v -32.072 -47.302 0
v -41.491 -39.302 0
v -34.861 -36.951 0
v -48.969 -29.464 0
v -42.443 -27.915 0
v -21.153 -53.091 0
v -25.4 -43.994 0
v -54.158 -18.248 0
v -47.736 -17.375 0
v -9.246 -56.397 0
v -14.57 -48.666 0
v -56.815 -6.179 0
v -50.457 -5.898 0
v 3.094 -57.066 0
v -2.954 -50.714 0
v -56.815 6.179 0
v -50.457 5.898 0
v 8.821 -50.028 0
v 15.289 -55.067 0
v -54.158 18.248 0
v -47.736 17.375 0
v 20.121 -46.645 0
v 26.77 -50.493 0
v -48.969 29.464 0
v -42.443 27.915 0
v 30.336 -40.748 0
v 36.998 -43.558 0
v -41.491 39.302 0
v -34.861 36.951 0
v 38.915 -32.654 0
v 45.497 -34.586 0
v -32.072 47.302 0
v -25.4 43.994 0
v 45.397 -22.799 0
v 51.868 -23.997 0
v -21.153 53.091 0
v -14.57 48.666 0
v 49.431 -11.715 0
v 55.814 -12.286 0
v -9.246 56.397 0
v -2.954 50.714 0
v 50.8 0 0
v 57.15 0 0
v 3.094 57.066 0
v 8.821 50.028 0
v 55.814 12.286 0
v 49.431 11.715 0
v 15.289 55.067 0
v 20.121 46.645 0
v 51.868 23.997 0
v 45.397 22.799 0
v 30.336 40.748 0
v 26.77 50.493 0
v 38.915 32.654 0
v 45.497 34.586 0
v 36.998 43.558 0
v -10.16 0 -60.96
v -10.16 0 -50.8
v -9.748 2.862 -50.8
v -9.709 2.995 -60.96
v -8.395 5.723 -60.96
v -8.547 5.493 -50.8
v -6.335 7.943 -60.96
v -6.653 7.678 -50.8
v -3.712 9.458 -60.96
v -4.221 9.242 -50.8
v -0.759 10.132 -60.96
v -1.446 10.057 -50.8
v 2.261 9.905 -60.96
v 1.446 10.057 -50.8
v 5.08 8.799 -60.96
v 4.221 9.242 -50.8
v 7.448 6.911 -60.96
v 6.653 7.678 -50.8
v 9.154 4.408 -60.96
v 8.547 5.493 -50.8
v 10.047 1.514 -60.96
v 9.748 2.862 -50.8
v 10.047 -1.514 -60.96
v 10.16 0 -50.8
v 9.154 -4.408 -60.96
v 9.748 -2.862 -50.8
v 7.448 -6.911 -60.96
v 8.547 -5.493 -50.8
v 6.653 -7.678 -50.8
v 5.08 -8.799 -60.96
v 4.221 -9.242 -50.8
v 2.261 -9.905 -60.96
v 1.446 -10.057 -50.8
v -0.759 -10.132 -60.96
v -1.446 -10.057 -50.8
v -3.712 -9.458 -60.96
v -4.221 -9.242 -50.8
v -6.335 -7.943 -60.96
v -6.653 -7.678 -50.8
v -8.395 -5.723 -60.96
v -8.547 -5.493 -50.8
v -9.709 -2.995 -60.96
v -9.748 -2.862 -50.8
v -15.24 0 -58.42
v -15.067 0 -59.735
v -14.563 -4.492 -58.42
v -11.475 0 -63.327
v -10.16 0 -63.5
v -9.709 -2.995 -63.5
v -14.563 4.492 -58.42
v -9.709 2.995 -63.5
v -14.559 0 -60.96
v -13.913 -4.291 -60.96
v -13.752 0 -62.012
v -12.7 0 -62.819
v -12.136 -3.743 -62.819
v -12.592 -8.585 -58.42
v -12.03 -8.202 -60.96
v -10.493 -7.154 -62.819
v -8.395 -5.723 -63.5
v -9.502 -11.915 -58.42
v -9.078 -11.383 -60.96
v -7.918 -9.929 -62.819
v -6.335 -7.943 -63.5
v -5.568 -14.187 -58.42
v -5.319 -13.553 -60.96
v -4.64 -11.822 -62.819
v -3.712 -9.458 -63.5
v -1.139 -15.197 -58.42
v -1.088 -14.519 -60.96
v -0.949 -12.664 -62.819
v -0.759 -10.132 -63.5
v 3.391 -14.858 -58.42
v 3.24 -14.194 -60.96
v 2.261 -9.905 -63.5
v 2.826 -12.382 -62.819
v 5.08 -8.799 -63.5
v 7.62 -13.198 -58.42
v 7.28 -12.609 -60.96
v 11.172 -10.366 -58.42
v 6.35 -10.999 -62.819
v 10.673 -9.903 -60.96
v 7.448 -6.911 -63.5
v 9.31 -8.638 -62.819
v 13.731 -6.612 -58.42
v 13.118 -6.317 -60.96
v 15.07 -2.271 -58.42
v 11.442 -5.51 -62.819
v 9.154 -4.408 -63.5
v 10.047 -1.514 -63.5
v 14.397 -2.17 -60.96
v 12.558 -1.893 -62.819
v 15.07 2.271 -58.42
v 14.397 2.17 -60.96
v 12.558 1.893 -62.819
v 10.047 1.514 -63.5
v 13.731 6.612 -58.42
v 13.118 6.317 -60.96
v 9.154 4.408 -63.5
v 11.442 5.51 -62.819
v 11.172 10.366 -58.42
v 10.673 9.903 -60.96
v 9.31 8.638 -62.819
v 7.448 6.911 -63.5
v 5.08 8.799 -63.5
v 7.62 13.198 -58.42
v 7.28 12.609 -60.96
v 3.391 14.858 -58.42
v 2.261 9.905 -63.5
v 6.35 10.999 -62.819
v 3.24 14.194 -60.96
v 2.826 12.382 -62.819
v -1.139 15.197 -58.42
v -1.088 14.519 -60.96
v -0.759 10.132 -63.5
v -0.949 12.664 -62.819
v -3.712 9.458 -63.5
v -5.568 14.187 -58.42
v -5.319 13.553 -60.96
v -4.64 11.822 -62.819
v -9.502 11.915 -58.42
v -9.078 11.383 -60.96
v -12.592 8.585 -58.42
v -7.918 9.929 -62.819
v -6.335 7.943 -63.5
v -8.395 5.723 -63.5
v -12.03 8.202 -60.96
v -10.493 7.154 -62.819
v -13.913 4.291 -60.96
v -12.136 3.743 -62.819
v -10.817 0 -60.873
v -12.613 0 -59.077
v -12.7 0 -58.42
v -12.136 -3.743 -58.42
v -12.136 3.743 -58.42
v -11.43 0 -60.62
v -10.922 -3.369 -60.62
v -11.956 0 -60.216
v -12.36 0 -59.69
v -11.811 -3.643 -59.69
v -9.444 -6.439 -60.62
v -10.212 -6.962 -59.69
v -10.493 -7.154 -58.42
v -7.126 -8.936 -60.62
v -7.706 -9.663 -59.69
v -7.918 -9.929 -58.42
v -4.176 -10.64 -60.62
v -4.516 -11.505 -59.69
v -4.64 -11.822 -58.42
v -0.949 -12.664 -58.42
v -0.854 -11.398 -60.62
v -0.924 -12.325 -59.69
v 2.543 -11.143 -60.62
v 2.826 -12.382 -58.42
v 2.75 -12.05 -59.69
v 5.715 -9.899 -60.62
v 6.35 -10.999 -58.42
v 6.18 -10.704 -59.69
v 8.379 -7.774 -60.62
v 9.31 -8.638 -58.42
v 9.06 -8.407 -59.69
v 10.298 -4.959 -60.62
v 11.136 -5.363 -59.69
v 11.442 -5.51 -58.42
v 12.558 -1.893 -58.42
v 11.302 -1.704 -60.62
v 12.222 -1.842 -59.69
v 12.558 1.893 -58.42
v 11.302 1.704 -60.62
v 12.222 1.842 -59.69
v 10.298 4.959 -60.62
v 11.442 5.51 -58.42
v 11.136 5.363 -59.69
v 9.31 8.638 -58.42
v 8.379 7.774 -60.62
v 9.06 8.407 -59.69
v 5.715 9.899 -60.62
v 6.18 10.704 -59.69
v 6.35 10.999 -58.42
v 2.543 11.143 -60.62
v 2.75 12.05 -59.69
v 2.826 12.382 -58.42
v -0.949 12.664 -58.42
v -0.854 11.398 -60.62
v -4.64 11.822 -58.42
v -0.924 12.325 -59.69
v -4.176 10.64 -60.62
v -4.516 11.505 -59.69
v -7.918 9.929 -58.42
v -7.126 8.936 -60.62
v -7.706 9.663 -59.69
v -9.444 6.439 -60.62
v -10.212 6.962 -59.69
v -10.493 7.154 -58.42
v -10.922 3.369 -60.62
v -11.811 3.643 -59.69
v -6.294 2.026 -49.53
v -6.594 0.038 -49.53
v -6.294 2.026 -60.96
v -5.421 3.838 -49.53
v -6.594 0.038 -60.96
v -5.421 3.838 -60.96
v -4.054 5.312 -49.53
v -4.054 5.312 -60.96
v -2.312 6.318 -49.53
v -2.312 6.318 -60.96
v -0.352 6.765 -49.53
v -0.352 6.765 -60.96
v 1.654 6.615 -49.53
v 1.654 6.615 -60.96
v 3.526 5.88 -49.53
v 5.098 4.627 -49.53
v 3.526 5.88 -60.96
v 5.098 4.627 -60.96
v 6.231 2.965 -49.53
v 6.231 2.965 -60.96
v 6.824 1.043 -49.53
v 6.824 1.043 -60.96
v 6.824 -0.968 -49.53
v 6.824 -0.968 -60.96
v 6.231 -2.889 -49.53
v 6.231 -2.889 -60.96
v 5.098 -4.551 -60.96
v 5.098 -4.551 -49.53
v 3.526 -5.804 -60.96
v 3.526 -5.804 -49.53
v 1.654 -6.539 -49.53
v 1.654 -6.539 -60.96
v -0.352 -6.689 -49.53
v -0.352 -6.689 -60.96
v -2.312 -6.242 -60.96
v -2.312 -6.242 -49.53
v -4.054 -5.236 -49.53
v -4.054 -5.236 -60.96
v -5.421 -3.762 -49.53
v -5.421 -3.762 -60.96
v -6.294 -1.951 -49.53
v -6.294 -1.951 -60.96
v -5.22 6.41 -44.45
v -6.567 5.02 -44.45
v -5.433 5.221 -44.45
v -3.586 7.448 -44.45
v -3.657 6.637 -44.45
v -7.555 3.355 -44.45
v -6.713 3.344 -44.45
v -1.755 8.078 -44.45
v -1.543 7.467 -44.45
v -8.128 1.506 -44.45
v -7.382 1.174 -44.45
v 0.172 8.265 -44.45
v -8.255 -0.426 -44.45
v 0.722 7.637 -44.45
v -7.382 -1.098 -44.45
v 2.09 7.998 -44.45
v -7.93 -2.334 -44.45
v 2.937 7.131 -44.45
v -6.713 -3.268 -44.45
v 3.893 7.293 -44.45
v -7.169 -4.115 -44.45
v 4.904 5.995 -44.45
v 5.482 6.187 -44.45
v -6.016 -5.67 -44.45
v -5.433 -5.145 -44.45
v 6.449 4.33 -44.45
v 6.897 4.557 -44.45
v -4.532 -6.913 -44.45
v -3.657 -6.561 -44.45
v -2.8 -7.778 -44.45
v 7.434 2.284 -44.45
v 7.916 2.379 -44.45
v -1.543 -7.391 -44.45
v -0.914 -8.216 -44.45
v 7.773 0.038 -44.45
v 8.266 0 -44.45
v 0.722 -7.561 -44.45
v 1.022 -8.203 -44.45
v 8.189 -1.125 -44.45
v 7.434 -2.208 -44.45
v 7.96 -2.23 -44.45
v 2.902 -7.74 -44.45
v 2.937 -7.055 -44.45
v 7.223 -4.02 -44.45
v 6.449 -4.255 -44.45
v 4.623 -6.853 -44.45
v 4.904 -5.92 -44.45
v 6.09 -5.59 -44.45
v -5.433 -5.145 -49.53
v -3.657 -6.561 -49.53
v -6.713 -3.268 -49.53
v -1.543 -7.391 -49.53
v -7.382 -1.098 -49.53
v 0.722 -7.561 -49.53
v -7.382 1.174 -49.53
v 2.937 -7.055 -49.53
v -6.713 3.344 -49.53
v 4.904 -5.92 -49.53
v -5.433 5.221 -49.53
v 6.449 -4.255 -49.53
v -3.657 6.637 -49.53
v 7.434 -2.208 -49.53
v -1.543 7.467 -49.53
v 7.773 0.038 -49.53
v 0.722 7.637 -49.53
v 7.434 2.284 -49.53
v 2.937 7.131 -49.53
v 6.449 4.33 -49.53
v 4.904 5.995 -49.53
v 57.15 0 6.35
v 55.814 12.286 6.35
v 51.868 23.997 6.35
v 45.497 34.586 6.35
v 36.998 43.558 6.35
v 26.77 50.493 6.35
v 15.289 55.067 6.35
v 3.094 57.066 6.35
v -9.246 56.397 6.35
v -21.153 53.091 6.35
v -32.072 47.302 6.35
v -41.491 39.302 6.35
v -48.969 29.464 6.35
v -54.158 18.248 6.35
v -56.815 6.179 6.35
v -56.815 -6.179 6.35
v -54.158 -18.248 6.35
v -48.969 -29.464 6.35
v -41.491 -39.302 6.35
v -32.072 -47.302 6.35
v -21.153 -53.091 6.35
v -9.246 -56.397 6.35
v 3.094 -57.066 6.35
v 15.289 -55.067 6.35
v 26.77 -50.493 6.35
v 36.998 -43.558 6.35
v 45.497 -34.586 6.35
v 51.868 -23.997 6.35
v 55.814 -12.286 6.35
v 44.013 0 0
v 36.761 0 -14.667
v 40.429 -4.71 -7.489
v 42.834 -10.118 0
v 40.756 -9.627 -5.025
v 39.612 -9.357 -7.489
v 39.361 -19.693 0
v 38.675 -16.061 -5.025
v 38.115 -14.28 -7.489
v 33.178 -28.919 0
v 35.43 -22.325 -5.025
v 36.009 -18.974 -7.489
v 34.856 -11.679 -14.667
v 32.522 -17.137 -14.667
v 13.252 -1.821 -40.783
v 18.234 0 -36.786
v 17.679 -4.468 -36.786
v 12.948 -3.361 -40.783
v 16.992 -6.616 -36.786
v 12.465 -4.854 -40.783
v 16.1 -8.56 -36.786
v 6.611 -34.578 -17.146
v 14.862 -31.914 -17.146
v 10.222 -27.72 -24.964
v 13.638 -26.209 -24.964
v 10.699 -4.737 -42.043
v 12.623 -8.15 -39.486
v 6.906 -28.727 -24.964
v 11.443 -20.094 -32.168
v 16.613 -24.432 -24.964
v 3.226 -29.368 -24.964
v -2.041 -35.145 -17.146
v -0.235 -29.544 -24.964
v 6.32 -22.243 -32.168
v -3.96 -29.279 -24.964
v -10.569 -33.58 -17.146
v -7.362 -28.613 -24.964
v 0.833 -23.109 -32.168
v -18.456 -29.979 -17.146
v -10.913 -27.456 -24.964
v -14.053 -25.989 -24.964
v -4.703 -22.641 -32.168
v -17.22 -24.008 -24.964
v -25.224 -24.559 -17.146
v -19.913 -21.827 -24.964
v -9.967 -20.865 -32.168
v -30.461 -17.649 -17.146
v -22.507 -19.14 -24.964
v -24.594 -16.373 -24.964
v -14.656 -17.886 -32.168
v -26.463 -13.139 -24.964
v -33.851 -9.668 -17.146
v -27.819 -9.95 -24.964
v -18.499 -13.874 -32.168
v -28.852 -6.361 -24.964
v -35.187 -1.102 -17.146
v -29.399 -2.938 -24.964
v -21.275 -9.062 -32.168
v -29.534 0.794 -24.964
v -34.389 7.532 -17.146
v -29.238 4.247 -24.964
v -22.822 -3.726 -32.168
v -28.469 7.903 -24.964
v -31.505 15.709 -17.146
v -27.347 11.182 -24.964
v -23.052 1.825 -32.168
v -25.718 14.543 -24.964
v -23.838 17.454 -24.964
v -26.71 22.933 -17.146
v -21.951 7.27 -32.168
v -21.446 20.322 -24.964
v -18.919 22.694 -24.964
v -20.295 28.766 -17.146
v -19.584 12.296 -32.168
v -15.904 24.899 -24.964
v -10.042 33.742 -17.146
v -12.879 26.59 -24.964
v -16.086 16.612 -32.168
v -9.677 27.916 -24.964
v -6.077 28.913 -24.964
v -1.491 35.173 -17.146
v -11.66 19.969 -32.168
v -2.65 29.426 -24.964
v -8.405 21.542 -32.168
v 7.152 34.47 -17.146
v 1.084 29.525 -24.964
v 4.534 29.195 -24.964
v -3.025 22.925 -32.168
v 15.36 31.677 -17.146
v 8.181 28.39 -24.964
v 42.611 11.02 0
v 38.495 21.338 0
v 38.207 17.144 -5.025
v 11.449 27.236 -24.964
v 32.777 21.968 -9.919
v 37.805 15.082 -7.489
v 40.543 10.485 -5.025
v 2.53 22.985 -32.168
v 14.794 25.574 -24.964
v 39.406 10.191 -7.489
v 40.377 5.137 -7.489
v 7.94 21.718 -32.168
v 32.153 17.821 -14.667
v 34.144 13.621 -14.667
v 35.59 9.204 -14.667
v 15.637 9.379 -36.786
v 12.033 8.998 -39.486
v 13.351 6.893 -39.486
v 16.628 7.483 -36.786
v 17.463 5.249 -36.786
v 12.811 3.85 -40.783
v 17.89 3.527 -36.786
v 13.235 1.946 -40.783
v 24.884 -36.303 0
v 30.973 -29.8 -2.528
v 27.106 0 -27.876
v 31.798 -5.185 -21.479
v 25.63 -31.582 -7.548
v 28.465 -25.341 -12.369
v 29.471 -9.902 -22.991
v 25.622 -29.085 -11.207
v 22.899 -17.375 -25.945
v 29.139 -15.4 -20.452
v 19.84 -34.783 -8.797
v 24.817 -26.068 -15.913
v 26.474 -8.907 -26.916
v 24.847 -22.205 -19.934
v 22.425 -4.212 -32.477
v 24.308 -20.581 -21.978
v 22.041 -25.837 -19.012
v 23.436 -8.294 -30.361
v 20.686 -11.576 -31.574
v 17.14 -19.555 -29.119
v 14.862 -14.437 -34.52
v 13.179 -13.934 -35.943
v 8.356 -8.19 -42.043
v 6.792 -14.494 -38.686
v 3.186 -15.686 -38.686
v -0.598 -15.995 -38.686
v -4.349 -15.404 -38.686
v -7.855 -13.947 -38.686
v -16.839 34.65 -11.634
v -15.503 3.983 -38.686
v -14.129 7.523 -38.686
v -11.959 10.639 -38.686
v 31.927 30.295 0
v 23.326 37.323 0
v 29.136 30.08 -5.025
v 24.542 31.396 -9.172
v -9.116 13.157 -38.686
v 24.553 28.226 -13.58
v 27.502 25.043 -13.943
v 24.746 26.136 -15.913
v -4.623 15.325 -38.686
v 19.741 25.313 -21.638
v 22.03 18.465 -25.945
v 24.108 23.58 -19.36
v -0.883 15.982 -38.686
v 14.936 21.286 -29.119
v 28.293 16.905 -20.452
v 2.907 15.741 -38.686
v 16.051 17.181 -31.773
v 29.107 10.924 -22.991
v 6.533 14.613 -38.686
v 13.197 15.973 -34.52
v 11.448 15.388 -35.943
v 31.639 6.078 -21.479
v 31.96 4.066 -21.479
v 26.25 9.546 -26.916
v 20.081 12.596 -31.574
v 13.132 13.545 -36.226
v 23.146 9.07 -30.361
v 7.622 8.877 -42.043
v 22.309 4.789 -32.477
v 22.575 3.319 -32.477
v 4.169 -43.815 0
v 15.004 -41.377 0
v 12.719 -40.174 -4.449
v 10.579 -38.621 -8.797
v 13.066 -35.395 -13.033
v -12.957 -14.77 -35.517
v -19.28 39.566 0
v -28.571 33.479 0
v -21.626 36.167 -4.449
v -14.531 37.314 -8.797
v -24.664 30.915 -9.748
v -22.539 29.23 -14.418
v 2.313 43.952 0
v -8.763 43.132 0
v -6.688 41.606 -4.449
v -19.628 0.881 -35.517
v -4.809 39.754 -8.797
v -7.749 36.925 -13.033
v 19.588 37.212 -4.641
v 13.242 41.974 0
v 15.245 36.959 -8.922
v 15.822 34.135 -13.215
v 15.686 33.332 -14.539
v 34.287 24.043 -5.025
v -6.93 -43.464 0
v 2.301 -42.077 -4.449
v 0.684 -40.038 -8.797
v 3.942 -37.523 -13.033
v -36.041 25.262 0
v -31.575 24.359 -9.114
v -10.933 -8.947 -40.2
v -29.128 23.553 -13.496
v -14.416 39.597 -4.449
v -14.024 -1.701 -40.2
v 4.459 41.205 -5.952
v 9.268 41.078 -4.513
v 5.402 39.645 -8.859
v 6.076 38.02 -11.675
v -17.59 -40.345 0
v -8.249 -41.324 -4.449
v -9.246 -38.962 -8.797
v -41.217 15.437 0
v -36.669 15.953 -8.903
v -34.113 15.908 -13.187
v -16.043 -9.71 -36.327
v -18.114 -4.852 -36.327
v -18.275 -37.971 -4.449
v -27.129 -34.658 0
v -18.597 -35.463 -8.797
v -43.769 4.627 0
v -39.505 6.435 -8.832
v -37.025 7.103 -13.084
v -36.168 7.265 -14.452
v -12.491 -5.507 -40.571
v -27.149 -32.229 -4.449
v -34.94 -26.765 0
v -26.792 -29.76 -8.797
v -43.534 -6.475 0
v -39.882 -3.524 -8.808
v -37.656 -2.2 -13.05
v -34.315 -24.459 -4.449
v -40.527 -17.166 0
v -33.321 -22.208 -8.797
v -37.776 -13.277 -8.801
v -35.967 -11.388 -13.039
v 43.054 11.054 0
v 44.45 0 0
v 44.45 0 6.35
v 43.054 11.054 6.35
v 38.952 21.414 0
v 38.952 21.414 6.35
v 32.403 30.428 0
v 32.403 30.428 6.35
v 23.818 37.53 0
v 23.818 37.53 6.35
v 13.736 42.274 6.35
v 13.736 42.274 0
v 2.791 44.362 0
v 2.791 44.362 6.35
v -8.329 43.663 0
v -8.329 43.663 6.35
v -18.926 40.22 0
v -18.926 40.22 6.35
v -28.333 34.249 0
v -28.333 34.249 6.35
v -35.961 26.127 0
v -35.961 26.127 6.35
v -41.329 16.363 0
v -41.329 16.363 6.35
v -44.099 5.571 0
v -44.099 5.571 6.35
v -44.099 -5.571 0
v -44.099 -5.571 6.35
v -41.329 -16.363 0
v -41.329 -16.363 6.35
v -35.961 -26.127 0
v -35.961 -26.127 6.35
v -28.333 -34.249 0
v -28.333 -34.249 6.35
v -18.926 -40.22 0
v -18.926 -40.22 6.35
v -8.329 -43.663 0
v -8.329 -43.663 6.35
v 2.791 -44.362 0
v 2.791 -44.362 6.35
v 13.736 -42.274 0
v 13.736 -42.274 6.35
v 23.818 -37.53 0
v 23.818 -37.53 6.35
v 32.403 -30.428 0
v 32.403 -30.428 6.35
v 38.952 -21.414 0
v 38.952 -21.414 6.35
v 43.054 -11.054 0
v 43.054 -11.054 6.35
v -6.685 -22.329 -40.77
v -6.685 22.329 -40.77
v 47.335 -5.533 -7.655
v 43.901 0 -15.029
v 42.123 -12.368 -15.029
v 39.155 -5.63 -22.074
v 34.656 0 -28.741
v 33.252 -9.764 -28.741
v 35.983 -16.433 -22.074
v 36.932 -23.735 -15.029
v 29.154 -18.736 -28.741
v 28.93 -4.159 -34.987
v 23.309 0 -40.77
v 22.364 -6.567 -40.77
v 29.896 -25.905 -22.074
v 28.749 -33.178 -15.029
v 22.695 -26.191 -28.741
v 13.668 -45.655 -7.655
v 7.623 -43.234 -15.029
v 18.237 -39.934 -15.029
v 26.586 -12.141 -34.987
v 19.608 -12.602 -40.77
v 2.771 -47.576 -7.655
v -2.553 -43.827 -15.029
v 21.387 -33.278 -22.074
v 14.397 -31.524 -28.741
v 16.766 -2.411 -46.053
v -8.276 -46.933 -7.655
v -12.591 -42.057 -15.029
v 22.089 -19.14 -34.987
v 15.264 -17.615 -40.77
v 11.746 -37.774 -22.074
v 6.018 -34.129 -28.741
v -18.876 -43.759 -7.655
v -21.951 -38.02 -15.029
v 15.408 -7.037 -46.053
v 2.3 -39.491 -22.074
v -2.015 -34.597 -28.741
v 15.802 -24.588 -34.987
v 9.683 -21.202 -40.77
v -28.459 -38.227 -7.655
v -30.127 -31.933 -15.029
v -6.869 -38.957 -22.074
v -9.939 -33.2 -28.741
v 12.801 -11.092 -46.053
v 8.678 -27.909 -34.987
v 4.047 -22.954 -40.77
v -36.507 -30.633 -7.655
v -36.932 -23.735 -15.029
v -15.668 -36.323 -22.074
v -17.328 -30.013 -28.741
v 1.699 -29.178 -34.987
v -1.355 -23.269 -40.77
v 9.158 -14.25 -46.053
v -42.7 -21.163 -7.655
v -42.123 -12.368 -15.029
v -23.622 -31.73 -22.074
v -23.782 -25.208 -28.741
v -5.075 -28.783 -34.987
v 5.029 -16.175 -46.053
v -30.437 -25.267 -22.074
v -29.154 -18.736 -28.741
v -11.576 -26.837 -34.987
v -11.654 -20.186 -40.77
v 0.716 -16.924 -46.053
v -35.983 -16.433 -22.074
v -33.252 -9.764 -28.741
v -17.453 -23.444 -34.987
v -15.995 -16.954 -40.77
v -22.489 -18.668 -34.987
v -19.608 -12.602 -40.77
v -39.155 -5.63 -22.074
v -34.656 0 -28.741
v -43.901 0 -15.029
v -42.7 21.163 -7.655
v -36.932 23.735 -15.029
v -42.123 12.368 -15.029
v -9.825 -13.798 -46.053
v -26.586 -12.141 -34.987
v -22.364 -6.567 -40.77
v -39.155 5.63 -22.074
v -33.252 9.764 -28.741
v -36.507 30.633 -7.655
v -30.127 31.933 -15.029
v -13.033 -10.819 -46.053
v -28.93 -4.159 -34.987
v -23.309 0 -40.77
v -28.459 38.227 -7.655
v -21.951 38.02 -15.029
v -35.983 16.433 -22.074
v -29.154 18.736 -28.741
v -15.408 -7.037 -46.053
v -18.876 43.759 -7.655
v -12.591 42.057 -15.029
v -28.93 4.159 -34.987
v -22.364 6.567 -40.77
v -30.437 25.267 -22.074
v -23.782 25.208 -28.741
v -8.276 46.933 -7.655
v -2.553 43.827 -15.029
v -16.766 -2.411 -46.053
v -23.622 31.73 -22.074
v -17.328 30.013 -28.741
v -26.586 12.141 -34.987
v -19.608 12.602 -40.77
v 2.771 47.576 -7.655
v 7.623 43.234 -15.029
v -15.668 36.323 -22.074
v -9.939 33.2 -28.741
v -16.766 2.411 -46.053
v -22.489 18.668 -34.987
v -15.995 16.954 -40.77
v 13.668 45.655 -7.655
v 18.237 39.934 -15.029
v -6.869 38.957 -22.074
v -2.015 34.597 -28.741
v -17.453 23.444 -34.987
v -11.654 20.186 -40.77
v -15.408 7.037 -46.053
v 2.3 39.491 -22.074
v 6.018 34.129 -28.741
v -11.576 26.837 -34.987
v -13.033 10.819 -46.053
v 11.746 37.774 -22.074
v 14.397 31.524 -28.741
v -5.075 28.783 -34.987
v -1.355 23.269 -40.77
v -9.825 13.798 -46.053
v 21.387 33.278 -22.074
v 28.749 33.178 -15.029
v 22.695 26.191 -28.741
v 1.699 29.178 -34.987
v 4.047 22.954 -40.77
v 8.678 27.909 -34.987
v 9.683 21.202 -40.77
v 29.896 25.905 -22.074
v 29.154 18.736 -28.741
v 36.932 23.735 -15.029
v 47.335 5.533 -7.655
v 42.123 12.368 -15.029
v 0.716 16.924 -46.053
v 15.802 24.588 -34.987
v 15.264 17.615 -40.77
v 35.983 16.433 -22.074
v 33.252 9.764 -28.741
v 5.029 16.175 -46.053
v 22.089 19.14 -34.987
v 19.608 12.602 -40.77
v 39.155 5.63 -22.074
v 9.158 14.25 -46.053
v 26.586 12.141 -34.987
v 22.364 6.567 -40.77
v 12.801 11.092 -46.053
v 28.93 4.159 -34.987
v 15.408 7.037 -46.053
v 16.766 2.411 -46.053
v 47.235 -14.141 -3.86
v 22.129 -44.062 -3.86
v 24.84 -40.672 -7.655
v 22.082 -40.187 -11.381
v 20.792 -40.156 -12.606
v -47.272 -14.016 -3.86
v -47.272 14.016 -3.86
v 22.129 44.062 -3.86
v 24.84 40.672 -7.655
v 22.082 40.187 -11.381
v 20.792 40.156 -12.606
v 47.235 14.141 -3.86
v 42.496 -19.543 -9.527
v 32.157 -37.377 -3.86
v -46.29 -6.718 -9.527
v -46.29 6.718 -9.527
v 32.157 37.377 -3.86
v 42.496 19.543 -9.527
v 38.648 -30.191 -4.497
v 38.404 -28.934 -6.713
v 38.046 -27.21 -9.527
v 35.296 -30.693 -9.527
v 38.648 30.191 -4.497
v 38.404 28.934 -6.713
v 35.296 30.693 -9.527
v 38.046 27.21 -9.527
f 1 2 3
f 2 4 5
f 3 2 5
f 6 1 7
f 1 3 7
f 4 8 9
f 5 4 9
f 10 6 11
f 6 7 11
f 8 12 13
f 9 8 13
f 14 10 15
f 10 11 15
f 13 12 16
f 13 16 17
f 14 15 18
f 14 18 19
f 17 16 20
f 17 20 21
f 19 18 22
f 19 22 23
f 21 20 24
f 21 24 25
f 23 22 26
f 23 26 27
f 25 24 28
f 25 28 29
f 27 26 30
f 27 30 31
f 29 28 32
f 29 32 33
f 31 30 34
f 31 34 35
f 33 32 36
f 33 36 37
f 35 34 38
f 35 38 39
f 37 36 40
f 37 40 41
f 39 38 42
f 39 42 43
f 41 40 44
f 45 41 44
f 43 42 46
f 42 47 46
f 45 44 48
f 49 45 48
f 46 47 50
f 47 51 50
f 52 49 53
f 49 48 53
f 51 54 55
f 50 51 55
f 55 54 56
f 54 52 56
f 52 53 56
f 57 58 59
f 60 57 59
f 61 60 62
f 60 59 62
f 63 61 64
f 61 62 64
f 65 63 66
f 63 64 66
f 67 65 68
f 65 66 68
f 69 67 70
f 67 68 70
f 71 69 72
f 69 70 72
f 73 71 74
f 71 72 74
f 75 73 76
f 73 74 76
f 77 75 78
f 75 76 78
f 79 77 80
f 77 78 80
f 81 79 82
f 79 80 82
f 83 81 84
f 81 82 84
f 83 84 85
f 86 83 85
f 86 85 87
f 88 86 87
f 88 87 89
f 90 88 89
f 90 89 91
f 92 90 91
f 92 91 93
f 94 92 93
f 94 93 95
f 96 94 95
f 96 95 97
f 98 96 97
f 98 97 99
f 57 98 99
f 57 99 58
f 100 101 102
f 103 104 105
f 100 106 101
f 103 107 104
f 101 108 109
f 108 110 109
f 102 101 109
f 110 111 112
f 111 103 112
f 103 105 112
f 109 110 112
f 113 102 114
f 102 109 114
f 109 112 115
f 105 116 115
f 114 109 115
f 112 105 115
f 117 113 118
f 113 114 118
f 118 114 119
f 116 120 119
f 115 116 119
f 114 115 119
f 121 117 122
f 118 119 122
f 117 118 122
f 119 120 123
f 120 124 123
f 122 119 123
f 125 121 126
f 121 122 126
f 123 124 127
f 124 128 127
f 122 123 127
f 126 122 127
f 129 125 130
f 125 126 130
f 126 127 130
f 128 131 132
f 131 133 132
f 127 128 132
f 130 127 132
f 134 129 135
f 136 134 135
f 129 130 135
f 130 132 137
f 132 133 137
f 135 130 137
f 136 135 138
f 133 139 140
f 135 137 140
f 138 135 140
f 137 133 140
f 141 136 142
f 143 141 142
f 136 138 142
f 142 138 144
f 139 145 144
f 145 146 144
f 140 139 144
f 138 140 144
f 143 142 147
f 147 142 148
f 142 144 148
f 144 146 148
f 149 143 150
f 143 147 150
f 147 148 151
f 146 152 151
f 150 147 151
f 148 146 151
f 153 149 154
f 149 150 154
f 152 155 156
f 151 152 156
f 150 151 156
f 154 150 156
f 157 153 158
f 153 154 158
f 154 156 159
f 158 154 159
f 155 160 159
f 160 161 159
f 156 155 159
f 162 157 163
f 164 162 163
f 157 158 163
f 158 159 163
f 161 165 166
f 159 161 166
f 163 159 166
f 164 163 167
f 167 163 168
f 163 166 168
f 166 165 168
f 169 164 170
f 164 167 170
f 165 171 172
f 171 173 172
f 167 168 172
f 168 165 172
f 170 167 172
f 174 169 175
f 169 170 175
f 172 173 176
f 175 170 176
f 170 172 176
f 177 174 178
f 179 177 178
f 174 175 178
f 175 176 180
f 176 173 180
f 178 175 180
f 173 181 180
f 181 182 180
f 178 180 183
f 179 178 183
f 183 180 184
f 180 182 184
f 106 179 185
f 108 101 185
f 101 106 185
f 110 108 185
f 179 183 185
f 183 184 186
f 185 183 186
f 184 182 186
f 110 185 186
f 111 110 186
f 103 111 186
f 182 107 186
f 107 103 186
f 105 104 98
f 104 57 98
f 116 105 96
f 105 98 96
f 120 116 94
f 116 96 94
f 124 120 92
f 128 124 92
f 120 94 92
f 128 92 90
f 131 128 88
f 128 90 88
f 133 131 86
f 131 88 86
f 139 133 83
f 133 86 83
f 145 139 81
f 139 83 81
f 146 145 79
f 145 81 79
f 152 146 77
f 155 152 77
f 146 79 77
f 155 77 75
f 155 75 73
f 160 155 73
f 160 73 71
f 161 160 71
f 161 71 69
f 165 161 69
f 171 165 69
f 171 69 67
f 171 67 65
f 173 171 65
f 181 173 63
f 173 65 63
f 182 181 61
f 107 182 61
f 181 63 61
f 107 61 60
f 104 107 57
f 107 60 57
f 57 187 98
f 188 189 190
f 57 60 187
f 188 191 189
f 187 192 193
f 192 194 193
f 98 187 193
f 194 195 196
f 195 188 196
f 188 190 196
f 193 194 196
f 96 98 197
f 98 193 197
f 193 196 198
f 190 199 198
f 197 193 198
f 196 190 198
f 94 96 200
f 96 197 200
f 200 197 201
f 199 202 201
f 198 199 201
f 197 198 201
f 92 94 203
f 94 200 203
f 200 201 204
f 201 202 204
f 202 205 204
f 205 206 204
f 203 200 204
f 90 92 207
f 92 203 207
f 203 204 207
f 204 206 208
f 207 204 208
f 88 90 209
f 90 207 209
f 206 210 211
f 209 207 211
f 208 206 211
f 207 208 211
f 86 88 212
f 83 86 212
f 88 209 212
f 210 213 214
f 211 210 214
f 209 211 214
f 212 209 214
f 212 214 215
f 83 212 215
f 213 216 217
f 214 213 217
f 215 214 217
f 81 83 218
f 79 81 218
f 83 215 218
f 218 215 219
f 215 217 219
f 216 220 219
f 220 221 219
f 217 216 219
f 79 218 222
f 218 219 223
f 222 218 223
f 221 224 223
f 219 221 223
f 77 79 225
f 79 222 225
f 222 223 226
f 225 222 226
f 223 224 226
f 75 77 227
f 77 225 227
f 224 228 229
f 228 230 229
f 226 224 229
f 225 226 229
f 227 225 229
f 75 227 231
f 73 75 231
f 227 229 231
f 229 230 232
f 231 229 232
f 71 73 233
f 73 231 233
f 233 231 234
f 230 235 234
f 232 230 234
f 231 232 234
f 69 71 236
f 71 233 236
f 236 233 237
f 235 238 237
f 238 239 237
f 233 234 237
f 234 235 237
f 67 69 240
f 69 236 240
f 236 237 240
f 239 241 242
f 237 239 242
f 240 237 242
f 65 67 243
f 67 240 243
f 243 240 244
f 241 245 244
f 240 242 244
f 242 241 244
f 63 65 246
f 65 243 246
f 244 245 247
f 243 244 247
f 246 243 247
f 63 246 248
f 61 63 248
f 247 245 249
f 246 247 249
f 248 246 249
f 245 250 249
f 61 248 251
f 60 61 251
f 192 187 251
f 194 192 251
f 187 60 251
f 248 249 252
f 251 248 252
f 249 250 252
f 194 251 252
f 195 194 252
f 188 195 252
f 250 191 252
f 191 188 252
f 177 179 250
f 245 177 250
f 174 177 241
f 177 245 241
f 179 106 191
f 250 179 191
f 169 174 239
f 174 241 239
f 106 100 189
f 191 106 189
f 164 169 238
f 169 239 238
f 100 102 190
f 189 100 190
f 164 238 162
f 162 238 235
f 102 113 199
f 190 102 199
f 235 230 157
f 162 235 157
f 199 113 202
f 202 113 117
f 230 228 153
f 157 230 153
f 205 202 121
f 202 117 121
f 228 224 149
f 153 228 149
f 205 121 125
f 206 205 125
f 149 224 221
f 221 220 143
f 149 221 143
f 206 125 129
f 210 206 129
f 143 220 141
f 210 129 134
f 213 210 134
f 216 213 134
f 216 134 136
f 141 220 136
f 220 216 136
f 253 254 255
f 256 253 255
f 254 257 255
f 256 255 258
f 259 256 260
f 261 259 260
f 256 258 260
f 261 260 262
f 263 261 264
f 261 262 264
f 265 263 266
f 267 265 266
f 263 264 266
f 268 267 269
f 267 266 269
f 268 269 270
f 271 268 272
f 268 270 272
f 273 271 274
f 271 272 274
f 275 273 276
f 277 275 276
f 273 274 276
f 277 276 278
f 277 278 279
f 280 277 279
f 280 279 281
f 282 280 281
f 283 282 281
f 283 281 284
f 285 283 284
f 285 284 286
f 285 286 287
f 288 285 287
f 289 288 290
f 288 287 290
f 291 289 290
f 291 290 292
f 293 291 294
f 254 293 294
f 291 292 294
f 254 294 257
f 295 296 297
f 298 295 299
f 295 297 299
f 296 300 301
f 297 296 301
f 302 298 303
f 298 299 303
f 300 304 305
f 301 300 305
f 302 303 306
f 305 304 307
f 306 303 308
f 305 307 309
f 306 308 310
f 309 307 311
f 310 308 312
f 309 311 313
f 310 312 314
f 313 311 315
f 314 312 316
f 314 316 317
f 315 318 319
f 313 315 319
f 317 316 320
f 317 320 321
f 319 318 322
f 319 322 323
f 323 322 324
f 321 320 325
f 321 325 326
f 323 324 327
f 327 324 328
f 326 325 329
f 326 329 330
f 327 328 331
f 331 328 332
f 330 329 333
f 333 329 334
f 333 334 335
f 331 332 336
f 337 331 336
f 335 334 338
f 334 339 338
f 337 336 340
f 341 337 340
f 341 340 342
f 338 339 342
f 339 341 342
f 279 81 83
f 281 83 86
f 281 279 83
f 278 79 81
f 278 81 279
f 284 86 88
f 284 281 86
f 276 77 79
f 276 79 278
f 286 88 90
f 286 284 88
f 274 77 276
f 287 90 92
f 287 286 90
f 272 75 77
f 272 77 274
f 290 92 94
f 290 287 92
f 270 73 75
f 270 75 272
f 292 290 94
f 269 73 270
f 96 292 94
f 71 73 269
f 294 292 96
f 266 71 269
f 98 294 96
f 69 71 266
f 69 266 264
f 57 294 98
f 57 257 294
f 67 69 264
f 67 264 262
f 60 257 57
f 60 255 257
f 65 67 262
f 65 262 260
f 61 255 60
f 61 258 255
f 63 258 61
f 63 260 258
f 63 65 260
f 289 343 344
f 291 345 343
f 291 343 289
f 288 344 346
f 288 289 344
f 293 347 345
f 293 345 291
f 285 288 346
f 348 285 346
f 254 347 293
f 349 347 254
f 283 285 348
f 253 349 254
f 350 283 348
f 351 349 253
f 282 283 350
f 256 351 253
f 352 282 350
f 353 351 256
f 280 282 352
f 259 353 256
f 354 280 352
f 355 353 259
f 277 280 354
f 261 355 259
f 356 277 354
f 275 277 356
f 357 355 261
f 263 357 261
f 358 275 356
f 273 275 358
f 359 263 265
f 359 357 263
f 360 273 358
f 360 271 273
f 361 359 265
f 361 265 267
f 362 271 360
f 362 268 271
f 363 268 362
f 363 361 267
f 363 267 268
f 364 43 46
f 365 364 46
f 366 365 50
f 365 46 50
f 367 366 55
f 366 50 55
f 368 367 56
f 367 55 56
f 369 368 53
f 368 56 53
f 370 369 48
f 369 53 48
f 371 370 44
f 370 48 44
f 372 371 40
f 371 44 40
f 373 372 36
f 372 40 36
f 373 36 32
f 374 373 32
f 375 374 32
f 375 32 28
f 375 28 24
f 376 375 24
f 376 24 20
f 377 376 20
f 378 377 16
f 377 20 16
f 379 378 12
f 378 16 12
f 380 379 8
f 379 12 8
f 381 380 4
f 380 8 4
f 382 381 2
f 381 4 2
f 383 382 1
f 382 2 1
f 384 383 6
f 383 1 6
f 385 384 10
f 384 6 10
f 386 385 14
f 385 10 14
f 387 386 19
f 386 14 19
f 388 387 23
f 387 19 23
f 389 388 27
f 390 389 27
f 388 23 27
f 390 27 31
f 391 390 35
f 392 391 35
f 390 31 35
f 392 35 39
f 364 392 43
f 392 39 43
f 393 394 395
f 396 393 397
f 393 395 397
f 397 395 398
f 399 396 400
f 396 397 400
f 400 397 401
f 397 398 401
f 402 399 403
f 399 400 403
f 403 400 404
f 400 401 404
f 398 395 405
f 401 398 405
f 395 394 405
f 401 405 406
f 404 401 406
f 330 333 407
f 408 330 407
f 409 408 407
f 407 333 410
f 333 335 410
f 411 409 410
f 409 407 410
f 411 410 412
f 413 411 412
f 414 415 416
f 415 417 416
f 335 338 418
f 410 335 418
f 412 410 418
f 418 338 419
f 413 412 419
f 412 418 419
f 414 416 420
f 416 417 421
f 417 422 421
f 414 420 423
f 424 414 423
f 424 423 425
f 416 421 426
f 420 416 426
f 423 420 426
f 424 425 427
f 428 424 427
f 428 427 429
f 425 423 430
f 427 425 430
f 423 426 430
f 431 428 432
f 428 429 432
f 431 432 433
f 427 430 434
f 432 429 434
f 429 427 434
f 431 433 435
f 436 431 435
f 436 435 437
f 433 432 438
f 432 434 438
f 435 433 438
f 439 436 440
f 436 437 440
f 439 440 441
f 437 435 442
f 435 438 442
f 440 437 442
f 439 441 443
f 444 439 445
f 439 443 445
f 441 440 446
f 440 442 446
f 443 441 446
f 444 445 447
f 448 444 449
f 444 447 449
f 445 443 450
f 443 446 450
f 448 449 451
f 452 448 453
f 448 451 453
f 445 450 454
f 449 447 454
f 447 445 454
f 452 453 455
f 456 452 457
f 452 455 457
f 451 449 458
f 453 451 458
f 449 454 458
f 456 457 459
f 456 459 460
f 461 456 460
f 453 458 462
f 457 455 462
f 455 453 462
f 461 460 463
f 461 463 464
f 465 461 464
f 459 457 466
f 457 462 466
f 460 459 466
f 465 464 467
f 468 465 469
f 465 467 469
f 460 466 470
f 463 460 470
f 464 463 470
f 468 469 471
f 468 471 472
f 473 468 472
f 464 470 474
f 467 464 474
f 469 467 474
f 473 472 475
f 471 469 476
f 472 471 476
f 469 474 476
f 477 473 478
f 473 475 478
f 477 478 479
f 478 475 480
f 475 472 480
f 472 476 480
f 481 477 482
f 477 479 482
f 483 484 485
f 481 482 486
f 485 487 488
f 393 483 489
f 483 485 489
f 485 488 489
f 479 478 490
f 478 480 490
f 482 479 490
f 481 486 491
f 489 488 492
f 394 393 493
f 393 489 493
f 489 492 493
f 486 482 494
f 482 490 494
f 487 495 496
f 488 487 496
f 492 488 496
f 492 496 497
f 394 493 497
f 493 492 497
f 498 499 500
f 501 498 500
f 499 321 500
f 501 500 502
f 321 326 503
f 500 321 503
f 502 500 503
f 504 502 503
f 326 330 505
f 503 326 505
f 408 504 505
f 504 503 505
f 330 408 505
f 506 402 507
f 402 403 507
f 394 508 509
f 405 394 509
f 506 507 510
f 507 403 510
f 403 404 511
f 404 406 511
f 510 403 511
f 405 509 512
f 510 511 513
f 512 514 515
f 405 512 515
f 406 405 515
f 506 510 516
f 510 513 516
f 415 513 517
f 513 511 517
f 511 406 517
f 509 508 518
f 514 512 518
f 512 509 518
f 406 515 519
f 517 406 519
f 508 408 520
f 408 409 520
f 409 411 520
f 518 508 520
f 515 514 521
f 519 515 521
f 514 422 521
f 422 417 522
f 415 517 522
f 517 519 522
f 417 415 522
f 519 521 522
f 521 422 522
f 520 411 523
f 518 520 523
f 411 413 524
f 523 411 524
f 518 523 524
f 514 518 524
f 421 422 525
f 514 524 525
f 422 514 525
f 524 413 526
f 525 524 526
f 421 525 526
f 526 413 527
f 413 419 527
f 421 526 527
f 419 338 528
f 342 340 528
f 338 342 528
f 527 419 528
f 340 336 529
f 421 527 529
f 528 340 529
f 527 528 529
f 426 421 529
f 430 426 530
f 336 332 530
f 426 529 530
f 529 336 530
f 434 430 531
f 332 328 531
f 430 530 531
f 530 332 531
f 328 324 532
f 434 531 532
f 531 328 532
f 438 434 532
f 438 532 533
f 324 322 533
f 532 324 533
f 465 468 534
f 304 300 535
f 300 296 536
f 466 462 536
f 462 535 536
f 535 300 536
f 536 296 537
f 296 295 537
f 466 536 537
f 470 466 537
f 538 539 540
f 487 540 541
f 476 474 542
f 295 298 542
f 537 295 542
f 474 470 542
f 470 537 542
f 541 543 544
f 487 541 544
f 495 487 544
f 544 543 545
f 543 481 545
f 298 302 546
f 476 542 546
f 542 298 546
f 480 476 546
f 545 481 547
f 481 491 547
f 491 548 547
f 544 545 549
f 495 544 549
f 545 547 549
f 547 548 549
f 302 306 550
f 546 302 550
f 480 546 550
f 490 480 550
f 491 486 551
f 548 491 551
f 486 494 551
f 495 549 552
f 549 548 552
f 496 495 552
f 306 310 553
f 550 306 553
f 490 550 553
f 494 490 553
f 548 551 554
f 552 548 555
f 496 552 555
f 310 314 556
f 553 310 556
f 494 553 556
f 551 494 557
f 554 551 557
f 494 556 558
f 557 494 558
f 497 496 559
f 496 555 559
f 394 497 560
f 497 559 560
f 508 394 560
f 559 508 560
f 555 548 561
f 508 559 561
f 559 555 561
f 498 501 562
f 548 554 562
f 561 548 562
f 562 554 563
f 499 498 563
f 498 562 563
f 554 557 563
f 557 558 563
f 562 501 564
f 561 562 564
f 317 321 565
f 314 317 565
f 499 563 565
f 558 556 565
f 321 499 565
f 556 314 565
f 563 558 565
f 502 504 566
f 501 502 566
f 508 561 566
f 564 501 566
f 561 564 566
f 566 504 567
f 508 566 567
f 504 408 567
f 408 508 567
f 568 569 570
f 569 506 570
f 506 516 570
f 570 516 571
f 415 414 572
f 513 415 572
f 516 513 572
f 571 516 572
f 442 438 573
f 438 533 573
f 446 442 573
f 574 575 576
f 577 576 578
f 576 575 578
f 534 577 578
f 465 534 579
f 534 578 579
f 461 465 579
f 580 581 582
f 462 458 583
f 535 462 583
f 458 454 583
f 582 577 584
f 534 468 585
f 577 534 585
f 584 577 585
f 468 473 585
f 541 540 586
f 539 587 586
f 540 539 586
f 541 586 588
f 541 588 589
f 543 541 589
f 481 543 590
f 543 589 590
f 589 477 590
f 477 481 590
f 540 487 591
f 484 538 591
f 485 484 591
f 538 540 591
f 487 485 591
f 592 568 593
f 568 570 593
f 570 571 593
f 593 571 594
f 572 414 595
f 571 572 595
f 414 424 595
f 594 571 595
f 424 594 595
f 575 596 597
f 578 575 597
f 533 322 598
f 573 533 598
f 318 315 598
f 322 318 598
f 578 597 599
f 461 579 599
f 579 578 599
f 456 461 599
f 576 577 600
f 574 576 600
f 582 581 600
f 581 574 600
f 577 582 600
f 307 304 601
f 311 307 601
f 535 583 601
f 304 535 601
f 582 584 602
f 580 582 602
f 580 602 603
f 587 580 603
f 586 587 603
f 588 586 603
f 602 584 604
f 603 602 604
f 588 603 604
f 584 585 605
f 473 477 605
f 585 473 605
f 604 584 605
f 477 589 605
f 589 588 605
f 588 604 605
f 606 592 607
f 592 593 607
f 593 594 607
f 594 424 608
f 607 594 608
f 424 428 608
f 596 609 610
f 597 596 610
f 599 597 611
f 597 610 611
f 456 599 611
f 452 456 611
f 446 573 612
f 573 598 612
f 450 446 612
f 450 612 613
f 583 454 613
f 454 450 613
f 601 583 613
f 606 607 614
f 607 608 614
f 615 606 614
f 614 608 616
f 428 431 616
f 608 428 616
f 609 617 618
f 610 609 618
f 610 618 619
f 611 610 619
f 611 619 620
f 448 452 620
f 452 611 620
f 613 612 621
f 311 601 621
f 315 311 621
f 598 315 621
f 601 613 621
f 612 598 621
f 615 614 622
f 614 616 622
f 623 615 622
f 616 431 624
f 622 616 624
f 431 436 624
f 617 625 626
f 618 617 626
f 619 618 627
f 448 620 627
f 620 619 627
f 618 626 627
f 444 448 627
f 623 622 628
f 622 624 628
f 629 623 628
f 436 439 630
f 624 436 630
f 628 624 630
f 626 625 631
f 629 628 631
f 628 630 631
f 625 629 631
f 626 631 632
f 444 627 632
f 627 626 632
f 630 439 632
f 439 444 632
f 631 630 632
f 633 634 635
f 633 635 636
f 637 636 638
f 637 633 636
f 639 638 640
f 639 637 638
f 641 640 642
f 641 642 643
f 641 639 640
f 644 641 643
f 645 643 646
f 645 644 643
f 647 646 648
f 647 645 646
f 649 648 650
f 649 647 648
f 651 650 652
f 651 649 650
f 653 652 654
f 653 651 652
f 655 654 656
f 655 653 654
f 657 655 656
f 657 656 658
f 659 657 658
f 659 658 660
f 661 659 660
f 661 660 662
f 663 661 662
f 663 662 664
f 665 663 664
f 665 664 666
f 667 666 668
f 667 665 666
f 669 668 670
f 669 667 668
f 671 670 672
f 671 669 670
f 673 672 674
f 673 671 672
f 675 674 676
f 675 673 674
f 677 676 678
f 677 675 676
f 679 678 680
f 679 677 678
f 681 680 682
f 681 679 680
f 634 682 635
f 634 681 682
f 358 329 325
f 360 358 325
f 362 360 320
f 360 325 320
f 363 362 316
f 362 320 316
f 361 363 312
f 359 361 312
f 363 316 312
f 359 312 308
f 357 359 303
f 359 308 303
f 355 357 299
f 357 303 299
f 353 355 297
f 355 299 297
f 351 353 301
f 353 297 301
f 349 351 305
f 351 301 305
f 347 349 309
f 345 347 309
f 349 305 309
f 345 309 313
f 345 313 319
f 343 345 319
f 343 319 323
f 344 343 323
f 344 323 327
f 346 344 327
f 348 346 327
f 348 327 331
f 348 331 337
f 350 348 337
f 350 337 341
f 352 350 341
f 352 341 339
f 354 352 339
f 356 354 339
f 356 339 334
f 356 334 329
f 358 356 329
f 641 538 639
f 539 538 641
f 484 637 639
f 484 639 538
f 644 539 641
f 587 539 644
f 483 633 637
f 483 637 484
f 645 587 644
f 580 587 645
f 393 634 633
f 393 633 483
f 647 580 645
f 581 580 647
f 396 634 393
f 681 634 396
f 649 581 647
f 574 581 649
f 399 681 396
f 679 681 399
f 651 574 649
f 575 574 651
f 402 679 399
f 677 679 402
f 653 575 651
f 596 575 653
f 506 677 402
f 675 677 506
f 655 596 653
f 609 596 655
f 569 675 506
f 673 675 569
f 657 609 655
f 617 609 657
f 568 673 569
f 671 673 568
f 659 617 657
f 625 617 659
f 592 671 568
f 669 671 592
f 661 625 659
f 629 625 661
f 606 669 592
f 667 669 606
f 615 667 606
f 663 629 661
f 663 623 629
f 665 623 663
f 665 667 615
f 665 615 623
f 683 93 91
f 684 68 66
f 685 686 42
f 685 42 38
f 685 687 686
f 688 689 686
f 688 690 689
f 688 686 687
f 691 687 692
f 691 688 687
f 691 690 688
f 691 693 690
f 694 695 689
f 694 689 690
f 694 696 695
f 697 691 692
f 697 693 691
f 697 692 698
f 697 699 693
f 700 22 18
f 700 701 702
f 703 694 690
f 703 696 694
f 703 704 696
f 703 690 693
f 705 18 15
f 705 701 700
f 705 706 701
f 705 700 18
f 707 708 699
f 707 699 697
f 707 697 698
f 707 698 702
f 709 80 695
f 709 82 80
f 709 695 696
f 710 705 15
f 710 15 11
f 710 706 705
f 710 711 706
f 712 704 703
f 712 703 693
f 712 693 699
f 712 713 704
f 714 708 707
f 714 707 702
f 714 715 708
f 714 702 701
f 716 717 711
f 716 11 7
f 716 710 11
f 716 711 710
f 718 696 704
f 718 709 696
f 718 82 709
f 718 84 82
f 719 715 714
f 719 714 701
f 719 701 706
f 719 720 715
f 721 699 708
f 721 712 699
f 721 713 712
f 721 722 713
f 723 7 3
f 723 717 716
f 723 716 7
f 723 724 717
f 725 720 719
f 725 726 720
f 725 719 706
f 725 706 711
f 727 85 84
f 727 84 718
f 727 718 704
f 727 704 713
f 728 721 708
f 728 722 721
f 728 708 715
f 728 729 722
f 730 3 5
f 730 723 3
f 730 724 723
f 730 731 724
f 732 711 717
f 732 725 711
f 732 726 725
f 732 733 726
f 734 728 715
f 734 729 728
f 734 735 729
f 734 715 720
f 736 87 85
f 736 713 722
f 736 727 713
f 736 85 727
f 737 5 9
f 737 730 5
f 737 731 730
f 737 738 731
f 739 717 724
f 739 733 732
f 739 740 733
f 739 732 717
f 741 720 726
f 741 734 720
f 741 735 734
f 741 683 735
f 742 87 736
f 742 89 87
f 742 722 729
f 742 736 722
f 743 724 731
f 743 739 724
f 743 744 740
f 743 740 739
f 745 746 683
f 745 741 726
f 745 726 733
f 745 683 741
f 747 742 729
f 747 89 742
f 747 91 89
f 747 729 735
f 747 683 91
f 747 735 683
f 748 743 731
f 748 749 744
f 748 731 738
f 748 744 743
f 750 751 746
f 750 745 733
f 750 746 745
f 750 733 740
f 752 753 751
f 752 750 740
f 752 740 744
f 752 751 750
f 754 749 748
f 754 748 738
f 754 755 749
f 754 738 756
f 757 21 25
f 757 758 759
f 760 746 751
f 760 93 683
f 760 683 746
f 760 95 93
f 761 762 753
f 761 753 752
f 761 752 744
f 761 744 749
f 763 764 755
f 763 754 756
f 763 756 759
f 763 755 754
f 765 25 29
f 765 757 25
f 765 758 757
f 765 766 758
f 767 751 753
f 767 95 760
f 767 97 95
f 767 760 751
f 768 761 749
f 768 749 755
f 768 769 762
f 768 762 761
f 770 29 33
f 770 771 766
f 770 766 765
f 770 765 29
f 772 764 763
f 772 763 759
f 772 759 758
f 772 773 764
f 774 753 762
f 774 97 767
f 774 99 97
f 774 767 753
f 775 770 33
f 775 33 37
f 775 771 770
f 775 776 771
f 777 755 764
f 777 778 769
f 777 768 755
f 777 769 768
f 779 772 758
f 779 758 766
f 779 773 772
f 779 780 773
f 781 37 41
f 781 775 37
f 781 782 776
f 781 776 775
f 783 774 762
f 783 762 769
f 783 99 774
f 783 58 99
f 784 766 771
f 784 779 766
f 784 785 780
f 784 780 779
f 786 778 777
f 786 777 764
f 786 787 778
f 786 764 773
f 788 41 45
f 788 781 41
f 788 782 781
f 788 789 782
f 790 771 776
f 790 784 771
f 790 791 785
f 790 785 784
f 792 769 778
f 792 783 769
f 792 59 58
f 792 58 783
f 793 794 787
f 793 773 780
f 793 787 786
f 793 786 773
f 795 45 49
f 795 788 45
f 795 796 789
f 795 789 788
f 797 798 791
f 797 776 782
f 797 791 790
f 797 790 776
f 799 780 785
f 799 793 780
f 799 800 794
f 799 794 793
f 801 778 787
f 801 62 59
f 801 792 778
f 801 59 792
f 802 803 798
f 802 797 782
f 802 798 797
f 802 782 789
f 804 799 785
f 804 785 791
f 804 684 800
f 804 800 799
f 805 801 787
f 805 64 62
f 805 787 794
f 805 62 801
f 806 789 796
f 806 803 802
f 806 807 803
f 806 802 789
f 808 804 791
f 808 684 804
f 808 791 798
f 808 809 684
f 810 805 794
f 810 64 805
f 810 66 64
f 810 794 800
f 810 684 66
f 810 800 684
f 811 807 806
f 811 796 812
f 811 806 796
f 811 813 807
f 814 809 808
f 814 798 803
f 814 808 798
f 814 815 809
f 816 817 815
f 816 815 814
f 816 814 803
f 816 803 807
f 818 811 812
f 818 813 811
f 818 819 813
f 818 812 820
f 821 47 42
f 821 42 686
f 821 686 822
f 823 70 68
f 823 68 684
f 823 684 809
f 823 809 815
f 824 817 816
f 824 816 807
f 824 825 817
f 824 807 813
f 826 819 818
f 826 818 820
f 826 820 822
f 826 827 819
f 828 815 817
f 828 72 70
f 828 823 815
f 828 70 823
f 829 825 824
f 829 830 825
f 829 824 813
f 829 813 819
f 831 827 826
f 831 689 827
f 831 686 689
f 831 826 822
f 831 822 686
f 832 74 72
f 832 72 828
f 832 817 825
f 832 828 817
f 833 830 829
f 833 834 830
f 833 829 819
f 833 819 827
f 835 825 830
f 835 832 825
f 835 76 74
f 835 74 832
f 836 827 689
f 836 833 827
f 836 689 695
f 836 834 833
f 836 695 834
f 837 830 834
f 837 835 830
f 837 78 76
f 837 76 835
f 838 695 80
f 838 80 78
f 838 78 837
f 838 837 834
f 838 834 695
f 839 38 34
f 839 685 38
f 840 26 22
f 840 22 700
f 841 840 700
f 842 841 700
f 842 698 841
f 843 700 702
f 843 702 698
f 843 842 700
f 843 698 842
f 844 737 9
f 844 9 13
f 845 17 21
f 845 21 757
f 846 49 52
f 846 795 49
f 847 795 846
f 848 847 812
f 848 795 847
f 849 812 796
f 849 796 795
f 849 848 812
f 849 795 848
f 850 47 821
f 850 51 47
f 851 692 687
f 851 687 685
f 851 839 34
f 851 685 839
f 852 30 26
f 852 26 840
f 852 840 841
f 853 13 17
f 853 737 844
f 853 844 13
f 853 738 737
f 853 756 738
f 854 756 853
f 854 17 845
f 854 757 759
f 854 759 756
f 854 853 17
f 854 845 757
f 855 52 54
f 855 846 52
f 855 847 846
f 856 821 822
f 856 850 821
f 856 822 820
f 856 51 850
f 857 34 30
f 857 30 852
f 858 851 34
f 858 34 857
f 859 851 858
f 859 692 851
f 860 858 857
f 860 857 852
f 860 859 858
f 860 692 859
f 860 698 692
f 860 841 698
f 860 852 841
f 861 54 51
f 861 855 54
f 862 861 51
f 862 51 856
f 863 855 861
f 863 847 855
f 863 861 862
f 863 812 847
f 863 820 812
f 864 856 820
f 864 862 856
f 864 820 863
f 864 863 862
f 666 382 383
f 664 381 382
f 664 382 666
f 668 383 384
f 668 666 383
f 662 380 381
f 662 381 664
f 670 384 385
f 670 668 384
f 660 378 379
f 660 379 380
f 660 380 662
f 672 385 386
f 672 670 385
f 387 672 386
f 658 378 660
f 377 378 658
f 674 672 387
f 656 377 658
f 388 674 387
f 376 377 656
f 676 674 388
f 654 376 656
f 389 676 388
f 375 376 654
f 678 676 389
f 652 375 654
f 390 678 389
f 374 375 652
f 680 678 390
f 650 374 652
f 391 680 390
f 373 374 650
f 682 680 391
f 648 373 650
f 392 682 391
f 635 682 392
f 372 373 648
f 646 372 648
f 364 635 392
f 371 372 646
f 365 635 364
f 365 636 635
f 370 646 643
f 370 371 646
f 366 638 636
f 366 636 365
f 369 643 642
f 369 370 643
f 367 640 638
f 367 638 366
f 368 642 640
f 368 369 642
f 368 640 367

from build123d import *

# Parameters (mm, degrees)
LENS_SHELL_T          = -6.35
SKETCH2_R             = 10.16
LENS_NECK_DEPTH       = 10.16
BULB_HOLE_D           = 13.49248
BULB_HOLE_CBORE_D     = 15.24
BULB_HOLE_CBORE_DEPTH = 5.08
SKETCH5_R             = 57.15
SKETCH5_R_2           = 44.45
LENS_COVER_DEPTH      = 6.35


with BuildPart() as part:
    # Sketch1 → Base Revolve (revolve)
    with BuildSketch(Plane(origin=(0, 0, 0), x_dir=(0, 0, -1), z_dir=(1, 0, 0)), mode=Mode.PRIVATE) as base_revolve_sk:
        with BuildLine():
            Line((0, 0), (0, 50.8))
            ThreePointArc((0, 50.8), (28.740706548, 34.655883185), (50.8, 10.16))
            Line((50.8, 10.16), (50.8, 0))
            Line((50.8, 0), (0, 0))
        make_face()
    revolve(base_revolve_sk.sketch.rotate(Axis((0, 0, 22.428775877), (0, 0, -1)), 90), axis=Axis((0, 0, 22.428775877), (0, 0, -1)))

    # Lens Shell
    lens_shell_openings = [part.faces().sort_by_distance(p)[0] for p in [
        (0, 0, 0),
    ]]
    offset(amount=LENS_SHELL_T, openings=lens_shell_openings, kind=Kind.INTERSECTION)

    # Sketch2 → Lens Neck (add)
    with BuildSketch(Plane(origin=(0, 0, -50.8), x_dir=(-1, 0, 0), z_dir=(0, 0, -1))):
        Circle(SKETCH2_R)
    extrude(amount=LENS_NECK_DEPTH)

    # Bulb Hole (through all)
    with Locations(Plane(origin=(0.152613178, 0.03794408, -44.45), x_dir=(1, 0, 0), z_dir=(0, 0, 1))):
        with Locations((0, 0)):
            CounterBoreHole(BULB_HOLE_D / 2, BULB_HOLE_CBORE_D / 2, BULB_HOLE_CBORE_DEPTH)

    # Sketch5 → Lens Cover (add)
    with BuildSketch(Plane.XY):
        Circle(SKETCH5_R)
        Circle(SKETCH5_R_2, mode=Mode.SUBTRACT)
    extrude(amount=LENS_COVER_DEPTH)


with BuildPart() as body_2:
    # Sketch4 → Revolve-Thin1 (revolve)
    with BuildSketch(Plane(origin=(0, 0, 0), x_dir=(0, 0, -1), z_dir=(1, 0, 0)), mode=Mode.PRIVATE) as revolve_thin1_sk:
        with BuildLine():
            ThreePointArc((60.96, 10.16), (60.216051224, 11.956051224), (58.42, 12.7))
            Line((58.42, 12.7), (58.42, 15.24))
            ThreePointArc((58.42, 15.24), (62.012102448, 13.752102448), (63.5, 10.16))
            Line((63.5, 10.16), (60.96, 10.16))
        make_face()
    revolve(revolve_thin1_sk.sketch.rotate(Axis((0, 0, -60.96), (0, 0, 1)), 90), axis=Axis((0, 0, -60.96), (0, 0, 1)))


solid = Compound([part.part, body_2.part])
